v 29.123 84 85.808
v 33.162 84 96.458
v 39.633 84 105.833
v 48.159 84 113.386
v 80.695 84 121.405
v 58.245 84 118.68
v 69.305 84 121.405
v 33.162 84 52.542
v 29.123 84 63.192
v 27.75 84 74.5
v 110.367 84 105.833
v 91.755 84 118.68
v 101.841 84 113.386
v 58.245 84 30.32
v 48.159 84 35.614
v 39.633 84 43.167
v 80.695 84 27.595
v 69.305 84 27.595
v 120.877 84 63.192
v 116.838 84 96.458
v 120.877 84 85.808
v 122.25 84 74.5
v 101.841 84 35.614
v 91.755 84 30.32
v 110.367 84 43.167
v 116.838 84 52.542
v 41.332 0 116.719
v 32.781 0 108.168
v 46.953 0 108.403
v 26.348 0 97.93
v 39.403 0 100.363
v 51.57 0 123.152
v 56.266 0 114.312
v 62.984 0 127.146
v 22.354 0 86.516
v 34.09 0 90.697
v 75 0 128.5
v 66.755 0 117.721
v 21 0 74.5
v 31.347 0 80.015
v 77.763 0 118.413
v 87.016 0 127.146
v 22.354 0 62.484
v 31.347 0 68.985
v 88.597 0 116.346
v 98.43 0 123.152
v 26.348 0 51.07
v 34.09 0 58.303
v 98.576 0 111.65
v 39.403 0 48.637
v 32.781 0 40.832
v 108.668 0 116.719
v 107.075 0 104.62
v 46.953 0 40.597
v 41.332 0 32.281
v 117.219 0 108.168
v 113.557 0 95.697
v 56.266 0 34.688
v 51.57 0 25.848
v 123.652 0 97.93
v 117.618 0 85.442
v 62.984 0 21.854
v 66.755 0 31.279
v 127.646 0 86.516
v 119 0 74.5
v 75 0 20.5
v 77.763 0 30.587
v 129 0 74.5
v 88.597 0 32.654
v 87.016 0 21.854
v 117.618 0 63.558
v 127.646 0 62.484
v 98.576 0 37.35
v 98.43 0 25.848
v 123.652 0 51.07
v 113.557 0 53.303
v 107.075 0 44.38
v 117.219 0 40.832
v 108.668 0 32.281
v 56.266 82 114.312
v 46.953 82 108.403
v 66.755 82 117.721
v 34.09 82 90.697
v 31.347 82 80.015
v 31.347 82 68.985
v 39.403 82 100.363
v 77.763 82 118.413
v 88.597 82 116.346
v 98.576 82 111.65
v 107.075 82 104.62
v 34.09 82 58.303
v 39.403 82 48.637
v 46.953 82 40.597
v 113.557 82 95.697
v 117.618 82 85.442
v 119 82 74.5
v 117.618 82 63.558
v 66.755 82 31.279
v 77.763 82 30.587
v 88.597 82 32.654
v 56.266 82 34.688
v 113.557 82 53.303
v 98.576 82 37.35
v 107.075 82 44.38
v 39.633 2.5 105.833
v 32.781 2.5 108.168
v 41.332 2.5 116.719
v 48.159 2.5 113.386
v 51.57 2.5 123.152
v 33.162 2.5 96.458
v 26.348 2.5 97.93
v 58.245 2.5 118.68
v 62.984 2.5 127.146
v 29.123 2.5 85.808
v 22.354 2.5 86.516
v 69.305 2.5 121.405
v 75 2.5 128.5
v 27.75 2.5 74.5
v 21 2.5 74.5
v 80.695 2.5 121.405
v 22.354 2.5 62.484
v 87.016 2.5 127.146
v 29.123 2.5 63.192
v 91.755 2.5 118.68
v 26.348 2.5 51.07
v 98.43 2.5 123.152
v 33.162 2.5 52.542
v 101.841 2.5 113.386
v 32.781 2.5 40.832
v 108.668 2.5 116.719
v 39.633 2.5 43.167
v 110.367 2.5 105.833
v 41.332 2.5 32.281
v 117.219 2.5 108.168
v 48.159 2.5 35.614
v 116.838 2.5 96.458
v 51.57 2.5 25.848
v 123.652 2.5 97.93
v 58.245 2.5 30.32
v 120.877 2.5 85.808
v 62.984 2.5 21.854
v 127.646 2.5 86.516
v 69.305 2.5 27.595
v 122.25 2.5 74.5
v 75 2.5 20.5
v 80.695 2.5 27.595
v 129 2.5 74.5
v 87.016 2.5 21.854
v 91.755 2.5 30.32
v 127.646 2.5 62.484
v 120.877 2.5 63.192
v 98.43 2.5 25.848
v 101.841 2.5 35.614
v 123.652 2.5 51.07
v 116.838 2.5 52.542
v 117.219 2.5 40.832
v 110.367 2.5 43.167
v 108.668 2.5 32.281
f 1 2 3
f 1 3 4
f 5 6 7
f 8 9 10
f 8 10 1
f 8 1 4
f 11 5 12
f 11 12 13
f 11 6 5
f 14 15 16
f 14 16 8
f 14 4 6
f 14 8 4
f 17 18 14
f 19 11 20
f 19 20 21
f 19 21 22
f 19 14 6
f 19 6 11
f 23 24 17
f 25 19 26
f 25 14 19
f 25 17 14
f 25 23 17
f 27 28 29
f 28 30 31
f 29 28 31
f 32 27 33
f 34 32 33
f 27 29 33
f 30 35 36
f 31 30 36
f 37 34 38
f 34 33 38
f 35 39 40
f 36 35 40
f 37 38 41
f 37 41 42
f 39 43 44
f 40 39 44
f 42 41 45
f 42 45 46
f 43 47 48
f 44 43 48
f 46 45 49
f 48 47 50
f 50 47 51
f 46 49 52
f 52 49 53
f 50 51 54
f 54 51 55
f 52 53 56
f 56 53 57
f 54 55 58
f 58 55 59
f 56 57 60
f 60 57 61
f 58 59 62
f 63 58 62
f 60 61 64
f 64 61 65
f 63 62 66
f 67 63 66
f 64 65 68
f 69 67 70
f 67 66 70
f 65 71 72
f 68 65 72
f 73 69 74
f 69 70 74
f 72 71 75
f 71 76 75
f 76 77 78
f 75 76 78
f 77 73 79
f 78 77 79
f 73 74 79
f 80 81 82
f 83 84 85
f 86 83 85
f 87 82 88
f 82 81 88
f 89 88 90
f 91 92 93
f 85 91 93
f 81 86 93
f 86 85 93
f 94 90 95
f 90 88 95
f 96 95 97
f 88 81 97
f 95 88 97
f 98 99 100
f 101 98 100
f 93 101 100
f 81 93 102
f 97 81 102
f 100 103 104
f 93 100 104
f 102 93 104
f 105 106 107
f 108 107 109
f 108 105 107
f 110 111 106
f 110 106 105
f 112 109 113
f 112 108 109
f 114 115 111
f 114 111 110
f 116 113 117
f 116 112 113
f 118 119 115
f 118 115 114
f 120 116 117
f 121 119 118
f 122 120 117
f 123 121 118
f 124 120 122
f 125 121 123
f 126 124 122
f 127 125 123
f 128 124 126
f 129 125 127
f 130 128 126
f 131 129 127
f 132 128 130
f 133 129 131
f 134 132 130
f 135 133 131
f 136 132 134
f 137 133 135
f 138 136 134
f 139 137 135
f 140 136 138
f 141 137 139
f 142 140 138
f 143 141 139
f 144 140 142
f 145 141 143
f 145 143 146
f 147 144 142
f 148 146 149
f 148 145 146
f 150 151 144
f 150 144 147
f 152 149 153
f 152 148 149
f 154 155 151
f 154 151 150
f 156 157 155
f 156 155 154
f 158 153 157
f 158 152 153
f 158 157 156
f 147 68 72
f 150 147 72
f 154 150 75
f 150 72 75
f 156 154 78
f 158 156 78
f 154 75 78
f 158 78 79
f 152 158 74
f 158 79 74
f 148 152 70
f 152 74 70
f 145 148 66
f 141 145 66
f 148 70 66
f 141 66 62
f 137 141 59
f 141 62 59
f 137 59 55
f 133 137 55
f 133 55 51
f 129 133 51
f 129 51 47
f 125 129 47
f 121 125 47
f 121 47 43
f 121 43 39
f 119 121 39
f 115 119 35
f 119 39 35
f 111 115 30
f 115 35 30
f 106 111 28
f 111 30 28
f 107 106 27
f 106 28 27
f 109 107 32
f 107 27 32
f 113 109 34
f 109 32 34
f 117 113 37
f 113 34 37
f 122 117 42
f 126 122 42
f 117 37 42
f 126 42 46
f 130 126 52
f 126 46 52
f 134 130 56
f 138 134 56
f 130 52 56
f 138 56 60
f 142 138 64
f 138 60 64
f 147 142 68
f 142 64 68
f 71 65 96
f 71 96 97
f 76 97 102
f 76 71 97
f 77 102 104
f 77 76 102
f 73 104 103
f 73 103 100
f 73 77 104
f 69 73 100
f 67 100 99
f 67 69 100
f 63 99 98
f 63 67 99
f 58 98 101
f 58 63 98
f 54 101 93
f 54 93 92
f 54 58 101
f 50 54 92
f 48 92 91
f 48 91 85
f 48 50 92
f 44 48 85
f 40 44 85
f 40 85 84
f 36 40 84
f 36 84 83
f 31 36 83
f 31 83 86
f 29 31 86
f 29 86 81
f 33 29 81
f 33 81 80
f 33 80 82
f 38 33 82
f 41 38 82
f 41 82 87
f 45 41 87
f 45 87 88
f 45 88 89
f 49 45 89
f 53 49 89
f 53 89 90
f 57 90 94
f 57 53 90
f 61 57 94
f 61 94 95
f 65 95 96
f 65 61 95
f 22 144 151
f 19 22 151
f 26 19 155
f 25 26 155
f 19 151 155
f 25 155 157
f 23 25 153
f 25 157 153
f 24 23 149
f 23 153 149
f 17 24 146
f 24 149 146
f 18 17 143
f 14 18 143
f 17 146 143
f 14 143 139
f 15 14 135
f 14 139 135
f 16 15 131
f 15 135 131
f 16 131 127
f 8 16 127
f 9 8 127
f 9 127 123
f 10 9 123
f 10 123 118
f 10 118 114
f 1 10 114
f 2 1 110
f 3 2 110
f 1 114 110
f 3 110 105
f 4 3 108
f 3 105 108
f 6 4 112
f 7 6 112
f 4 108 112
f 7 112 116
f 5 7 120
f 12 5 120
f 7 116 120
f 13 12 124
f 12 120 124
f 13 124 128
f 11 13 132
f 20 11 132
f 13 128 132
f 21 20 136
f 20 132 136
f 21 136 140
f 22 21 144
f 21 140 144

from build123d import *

# Parameters (mm, degrees)
CYLINDER020_R             = 44
CYLINDER020_DEPTH         = 2.5
CYLINDER018_R             = 54
CYLINDER018_DEPTH         = 2.5
CYLINDER019_R             = 44
CYLINDER019_DEPTH         = 79.5
CYLINDER017_R             = 47.25
CYLINDER017_DEPTH         = 81.5
FUSION004_PLACEMENT_ANGLE = 90


with BuildPart() as cylinder016:
    # Cylinder020 → Cylinder020 (new body)
    with BuildSketch(Plane.XY.offset(-2.5)):
        Circle(CYLINDER020_R)
    extrude(amount=CYLINDER020_DEPTH)


with BuildPart() as cut004003:
    # Cylinder018 → Cylinder018 (new body)
    with BuildSketch(Plane.XY.offset(-2.5)):
        Circle(CYLINDER018_R)
    extrude(amount=CYLINDER018_DEPTH)

    # Cut004003: cut Cylinder016
    add(cylinder016.part, mode=Mode.SUBTRACT)


with BuildPart() as cylinder015:
    # Cylinder019 → Cylinder019 (new body)
    with BuildSketch(Plane.XY):
        Circle(CYLINDER019_R)
    extrude(amount=CYLINDER019_DEPTH)


with BuildPart() as cup:
    # Cylinder017 → Cylinder017 (new body)
    with BuildSketch(Plane.XY):
        Circle(CYLINDER017_R)
    extrude(amount=CYLINDER017_DEPTH)

    # Cut004002: cut Cylinder015
    add(cylinder015.part, mode=Mode.SUBTRACT)

    # Fusion004: union Cut004003
    add(cut004003.part)


with BuildPart() as cup_1:
    # Fusion004 placement: moved
    add(cup.part.moved(Location((75, 2.5, 74.5))).rotate(Axis((75, 2.5, 74.5), (-1, 0, 0)), FUSION004_PLACEMENT_ANGLE))


solid = cup_1.part
